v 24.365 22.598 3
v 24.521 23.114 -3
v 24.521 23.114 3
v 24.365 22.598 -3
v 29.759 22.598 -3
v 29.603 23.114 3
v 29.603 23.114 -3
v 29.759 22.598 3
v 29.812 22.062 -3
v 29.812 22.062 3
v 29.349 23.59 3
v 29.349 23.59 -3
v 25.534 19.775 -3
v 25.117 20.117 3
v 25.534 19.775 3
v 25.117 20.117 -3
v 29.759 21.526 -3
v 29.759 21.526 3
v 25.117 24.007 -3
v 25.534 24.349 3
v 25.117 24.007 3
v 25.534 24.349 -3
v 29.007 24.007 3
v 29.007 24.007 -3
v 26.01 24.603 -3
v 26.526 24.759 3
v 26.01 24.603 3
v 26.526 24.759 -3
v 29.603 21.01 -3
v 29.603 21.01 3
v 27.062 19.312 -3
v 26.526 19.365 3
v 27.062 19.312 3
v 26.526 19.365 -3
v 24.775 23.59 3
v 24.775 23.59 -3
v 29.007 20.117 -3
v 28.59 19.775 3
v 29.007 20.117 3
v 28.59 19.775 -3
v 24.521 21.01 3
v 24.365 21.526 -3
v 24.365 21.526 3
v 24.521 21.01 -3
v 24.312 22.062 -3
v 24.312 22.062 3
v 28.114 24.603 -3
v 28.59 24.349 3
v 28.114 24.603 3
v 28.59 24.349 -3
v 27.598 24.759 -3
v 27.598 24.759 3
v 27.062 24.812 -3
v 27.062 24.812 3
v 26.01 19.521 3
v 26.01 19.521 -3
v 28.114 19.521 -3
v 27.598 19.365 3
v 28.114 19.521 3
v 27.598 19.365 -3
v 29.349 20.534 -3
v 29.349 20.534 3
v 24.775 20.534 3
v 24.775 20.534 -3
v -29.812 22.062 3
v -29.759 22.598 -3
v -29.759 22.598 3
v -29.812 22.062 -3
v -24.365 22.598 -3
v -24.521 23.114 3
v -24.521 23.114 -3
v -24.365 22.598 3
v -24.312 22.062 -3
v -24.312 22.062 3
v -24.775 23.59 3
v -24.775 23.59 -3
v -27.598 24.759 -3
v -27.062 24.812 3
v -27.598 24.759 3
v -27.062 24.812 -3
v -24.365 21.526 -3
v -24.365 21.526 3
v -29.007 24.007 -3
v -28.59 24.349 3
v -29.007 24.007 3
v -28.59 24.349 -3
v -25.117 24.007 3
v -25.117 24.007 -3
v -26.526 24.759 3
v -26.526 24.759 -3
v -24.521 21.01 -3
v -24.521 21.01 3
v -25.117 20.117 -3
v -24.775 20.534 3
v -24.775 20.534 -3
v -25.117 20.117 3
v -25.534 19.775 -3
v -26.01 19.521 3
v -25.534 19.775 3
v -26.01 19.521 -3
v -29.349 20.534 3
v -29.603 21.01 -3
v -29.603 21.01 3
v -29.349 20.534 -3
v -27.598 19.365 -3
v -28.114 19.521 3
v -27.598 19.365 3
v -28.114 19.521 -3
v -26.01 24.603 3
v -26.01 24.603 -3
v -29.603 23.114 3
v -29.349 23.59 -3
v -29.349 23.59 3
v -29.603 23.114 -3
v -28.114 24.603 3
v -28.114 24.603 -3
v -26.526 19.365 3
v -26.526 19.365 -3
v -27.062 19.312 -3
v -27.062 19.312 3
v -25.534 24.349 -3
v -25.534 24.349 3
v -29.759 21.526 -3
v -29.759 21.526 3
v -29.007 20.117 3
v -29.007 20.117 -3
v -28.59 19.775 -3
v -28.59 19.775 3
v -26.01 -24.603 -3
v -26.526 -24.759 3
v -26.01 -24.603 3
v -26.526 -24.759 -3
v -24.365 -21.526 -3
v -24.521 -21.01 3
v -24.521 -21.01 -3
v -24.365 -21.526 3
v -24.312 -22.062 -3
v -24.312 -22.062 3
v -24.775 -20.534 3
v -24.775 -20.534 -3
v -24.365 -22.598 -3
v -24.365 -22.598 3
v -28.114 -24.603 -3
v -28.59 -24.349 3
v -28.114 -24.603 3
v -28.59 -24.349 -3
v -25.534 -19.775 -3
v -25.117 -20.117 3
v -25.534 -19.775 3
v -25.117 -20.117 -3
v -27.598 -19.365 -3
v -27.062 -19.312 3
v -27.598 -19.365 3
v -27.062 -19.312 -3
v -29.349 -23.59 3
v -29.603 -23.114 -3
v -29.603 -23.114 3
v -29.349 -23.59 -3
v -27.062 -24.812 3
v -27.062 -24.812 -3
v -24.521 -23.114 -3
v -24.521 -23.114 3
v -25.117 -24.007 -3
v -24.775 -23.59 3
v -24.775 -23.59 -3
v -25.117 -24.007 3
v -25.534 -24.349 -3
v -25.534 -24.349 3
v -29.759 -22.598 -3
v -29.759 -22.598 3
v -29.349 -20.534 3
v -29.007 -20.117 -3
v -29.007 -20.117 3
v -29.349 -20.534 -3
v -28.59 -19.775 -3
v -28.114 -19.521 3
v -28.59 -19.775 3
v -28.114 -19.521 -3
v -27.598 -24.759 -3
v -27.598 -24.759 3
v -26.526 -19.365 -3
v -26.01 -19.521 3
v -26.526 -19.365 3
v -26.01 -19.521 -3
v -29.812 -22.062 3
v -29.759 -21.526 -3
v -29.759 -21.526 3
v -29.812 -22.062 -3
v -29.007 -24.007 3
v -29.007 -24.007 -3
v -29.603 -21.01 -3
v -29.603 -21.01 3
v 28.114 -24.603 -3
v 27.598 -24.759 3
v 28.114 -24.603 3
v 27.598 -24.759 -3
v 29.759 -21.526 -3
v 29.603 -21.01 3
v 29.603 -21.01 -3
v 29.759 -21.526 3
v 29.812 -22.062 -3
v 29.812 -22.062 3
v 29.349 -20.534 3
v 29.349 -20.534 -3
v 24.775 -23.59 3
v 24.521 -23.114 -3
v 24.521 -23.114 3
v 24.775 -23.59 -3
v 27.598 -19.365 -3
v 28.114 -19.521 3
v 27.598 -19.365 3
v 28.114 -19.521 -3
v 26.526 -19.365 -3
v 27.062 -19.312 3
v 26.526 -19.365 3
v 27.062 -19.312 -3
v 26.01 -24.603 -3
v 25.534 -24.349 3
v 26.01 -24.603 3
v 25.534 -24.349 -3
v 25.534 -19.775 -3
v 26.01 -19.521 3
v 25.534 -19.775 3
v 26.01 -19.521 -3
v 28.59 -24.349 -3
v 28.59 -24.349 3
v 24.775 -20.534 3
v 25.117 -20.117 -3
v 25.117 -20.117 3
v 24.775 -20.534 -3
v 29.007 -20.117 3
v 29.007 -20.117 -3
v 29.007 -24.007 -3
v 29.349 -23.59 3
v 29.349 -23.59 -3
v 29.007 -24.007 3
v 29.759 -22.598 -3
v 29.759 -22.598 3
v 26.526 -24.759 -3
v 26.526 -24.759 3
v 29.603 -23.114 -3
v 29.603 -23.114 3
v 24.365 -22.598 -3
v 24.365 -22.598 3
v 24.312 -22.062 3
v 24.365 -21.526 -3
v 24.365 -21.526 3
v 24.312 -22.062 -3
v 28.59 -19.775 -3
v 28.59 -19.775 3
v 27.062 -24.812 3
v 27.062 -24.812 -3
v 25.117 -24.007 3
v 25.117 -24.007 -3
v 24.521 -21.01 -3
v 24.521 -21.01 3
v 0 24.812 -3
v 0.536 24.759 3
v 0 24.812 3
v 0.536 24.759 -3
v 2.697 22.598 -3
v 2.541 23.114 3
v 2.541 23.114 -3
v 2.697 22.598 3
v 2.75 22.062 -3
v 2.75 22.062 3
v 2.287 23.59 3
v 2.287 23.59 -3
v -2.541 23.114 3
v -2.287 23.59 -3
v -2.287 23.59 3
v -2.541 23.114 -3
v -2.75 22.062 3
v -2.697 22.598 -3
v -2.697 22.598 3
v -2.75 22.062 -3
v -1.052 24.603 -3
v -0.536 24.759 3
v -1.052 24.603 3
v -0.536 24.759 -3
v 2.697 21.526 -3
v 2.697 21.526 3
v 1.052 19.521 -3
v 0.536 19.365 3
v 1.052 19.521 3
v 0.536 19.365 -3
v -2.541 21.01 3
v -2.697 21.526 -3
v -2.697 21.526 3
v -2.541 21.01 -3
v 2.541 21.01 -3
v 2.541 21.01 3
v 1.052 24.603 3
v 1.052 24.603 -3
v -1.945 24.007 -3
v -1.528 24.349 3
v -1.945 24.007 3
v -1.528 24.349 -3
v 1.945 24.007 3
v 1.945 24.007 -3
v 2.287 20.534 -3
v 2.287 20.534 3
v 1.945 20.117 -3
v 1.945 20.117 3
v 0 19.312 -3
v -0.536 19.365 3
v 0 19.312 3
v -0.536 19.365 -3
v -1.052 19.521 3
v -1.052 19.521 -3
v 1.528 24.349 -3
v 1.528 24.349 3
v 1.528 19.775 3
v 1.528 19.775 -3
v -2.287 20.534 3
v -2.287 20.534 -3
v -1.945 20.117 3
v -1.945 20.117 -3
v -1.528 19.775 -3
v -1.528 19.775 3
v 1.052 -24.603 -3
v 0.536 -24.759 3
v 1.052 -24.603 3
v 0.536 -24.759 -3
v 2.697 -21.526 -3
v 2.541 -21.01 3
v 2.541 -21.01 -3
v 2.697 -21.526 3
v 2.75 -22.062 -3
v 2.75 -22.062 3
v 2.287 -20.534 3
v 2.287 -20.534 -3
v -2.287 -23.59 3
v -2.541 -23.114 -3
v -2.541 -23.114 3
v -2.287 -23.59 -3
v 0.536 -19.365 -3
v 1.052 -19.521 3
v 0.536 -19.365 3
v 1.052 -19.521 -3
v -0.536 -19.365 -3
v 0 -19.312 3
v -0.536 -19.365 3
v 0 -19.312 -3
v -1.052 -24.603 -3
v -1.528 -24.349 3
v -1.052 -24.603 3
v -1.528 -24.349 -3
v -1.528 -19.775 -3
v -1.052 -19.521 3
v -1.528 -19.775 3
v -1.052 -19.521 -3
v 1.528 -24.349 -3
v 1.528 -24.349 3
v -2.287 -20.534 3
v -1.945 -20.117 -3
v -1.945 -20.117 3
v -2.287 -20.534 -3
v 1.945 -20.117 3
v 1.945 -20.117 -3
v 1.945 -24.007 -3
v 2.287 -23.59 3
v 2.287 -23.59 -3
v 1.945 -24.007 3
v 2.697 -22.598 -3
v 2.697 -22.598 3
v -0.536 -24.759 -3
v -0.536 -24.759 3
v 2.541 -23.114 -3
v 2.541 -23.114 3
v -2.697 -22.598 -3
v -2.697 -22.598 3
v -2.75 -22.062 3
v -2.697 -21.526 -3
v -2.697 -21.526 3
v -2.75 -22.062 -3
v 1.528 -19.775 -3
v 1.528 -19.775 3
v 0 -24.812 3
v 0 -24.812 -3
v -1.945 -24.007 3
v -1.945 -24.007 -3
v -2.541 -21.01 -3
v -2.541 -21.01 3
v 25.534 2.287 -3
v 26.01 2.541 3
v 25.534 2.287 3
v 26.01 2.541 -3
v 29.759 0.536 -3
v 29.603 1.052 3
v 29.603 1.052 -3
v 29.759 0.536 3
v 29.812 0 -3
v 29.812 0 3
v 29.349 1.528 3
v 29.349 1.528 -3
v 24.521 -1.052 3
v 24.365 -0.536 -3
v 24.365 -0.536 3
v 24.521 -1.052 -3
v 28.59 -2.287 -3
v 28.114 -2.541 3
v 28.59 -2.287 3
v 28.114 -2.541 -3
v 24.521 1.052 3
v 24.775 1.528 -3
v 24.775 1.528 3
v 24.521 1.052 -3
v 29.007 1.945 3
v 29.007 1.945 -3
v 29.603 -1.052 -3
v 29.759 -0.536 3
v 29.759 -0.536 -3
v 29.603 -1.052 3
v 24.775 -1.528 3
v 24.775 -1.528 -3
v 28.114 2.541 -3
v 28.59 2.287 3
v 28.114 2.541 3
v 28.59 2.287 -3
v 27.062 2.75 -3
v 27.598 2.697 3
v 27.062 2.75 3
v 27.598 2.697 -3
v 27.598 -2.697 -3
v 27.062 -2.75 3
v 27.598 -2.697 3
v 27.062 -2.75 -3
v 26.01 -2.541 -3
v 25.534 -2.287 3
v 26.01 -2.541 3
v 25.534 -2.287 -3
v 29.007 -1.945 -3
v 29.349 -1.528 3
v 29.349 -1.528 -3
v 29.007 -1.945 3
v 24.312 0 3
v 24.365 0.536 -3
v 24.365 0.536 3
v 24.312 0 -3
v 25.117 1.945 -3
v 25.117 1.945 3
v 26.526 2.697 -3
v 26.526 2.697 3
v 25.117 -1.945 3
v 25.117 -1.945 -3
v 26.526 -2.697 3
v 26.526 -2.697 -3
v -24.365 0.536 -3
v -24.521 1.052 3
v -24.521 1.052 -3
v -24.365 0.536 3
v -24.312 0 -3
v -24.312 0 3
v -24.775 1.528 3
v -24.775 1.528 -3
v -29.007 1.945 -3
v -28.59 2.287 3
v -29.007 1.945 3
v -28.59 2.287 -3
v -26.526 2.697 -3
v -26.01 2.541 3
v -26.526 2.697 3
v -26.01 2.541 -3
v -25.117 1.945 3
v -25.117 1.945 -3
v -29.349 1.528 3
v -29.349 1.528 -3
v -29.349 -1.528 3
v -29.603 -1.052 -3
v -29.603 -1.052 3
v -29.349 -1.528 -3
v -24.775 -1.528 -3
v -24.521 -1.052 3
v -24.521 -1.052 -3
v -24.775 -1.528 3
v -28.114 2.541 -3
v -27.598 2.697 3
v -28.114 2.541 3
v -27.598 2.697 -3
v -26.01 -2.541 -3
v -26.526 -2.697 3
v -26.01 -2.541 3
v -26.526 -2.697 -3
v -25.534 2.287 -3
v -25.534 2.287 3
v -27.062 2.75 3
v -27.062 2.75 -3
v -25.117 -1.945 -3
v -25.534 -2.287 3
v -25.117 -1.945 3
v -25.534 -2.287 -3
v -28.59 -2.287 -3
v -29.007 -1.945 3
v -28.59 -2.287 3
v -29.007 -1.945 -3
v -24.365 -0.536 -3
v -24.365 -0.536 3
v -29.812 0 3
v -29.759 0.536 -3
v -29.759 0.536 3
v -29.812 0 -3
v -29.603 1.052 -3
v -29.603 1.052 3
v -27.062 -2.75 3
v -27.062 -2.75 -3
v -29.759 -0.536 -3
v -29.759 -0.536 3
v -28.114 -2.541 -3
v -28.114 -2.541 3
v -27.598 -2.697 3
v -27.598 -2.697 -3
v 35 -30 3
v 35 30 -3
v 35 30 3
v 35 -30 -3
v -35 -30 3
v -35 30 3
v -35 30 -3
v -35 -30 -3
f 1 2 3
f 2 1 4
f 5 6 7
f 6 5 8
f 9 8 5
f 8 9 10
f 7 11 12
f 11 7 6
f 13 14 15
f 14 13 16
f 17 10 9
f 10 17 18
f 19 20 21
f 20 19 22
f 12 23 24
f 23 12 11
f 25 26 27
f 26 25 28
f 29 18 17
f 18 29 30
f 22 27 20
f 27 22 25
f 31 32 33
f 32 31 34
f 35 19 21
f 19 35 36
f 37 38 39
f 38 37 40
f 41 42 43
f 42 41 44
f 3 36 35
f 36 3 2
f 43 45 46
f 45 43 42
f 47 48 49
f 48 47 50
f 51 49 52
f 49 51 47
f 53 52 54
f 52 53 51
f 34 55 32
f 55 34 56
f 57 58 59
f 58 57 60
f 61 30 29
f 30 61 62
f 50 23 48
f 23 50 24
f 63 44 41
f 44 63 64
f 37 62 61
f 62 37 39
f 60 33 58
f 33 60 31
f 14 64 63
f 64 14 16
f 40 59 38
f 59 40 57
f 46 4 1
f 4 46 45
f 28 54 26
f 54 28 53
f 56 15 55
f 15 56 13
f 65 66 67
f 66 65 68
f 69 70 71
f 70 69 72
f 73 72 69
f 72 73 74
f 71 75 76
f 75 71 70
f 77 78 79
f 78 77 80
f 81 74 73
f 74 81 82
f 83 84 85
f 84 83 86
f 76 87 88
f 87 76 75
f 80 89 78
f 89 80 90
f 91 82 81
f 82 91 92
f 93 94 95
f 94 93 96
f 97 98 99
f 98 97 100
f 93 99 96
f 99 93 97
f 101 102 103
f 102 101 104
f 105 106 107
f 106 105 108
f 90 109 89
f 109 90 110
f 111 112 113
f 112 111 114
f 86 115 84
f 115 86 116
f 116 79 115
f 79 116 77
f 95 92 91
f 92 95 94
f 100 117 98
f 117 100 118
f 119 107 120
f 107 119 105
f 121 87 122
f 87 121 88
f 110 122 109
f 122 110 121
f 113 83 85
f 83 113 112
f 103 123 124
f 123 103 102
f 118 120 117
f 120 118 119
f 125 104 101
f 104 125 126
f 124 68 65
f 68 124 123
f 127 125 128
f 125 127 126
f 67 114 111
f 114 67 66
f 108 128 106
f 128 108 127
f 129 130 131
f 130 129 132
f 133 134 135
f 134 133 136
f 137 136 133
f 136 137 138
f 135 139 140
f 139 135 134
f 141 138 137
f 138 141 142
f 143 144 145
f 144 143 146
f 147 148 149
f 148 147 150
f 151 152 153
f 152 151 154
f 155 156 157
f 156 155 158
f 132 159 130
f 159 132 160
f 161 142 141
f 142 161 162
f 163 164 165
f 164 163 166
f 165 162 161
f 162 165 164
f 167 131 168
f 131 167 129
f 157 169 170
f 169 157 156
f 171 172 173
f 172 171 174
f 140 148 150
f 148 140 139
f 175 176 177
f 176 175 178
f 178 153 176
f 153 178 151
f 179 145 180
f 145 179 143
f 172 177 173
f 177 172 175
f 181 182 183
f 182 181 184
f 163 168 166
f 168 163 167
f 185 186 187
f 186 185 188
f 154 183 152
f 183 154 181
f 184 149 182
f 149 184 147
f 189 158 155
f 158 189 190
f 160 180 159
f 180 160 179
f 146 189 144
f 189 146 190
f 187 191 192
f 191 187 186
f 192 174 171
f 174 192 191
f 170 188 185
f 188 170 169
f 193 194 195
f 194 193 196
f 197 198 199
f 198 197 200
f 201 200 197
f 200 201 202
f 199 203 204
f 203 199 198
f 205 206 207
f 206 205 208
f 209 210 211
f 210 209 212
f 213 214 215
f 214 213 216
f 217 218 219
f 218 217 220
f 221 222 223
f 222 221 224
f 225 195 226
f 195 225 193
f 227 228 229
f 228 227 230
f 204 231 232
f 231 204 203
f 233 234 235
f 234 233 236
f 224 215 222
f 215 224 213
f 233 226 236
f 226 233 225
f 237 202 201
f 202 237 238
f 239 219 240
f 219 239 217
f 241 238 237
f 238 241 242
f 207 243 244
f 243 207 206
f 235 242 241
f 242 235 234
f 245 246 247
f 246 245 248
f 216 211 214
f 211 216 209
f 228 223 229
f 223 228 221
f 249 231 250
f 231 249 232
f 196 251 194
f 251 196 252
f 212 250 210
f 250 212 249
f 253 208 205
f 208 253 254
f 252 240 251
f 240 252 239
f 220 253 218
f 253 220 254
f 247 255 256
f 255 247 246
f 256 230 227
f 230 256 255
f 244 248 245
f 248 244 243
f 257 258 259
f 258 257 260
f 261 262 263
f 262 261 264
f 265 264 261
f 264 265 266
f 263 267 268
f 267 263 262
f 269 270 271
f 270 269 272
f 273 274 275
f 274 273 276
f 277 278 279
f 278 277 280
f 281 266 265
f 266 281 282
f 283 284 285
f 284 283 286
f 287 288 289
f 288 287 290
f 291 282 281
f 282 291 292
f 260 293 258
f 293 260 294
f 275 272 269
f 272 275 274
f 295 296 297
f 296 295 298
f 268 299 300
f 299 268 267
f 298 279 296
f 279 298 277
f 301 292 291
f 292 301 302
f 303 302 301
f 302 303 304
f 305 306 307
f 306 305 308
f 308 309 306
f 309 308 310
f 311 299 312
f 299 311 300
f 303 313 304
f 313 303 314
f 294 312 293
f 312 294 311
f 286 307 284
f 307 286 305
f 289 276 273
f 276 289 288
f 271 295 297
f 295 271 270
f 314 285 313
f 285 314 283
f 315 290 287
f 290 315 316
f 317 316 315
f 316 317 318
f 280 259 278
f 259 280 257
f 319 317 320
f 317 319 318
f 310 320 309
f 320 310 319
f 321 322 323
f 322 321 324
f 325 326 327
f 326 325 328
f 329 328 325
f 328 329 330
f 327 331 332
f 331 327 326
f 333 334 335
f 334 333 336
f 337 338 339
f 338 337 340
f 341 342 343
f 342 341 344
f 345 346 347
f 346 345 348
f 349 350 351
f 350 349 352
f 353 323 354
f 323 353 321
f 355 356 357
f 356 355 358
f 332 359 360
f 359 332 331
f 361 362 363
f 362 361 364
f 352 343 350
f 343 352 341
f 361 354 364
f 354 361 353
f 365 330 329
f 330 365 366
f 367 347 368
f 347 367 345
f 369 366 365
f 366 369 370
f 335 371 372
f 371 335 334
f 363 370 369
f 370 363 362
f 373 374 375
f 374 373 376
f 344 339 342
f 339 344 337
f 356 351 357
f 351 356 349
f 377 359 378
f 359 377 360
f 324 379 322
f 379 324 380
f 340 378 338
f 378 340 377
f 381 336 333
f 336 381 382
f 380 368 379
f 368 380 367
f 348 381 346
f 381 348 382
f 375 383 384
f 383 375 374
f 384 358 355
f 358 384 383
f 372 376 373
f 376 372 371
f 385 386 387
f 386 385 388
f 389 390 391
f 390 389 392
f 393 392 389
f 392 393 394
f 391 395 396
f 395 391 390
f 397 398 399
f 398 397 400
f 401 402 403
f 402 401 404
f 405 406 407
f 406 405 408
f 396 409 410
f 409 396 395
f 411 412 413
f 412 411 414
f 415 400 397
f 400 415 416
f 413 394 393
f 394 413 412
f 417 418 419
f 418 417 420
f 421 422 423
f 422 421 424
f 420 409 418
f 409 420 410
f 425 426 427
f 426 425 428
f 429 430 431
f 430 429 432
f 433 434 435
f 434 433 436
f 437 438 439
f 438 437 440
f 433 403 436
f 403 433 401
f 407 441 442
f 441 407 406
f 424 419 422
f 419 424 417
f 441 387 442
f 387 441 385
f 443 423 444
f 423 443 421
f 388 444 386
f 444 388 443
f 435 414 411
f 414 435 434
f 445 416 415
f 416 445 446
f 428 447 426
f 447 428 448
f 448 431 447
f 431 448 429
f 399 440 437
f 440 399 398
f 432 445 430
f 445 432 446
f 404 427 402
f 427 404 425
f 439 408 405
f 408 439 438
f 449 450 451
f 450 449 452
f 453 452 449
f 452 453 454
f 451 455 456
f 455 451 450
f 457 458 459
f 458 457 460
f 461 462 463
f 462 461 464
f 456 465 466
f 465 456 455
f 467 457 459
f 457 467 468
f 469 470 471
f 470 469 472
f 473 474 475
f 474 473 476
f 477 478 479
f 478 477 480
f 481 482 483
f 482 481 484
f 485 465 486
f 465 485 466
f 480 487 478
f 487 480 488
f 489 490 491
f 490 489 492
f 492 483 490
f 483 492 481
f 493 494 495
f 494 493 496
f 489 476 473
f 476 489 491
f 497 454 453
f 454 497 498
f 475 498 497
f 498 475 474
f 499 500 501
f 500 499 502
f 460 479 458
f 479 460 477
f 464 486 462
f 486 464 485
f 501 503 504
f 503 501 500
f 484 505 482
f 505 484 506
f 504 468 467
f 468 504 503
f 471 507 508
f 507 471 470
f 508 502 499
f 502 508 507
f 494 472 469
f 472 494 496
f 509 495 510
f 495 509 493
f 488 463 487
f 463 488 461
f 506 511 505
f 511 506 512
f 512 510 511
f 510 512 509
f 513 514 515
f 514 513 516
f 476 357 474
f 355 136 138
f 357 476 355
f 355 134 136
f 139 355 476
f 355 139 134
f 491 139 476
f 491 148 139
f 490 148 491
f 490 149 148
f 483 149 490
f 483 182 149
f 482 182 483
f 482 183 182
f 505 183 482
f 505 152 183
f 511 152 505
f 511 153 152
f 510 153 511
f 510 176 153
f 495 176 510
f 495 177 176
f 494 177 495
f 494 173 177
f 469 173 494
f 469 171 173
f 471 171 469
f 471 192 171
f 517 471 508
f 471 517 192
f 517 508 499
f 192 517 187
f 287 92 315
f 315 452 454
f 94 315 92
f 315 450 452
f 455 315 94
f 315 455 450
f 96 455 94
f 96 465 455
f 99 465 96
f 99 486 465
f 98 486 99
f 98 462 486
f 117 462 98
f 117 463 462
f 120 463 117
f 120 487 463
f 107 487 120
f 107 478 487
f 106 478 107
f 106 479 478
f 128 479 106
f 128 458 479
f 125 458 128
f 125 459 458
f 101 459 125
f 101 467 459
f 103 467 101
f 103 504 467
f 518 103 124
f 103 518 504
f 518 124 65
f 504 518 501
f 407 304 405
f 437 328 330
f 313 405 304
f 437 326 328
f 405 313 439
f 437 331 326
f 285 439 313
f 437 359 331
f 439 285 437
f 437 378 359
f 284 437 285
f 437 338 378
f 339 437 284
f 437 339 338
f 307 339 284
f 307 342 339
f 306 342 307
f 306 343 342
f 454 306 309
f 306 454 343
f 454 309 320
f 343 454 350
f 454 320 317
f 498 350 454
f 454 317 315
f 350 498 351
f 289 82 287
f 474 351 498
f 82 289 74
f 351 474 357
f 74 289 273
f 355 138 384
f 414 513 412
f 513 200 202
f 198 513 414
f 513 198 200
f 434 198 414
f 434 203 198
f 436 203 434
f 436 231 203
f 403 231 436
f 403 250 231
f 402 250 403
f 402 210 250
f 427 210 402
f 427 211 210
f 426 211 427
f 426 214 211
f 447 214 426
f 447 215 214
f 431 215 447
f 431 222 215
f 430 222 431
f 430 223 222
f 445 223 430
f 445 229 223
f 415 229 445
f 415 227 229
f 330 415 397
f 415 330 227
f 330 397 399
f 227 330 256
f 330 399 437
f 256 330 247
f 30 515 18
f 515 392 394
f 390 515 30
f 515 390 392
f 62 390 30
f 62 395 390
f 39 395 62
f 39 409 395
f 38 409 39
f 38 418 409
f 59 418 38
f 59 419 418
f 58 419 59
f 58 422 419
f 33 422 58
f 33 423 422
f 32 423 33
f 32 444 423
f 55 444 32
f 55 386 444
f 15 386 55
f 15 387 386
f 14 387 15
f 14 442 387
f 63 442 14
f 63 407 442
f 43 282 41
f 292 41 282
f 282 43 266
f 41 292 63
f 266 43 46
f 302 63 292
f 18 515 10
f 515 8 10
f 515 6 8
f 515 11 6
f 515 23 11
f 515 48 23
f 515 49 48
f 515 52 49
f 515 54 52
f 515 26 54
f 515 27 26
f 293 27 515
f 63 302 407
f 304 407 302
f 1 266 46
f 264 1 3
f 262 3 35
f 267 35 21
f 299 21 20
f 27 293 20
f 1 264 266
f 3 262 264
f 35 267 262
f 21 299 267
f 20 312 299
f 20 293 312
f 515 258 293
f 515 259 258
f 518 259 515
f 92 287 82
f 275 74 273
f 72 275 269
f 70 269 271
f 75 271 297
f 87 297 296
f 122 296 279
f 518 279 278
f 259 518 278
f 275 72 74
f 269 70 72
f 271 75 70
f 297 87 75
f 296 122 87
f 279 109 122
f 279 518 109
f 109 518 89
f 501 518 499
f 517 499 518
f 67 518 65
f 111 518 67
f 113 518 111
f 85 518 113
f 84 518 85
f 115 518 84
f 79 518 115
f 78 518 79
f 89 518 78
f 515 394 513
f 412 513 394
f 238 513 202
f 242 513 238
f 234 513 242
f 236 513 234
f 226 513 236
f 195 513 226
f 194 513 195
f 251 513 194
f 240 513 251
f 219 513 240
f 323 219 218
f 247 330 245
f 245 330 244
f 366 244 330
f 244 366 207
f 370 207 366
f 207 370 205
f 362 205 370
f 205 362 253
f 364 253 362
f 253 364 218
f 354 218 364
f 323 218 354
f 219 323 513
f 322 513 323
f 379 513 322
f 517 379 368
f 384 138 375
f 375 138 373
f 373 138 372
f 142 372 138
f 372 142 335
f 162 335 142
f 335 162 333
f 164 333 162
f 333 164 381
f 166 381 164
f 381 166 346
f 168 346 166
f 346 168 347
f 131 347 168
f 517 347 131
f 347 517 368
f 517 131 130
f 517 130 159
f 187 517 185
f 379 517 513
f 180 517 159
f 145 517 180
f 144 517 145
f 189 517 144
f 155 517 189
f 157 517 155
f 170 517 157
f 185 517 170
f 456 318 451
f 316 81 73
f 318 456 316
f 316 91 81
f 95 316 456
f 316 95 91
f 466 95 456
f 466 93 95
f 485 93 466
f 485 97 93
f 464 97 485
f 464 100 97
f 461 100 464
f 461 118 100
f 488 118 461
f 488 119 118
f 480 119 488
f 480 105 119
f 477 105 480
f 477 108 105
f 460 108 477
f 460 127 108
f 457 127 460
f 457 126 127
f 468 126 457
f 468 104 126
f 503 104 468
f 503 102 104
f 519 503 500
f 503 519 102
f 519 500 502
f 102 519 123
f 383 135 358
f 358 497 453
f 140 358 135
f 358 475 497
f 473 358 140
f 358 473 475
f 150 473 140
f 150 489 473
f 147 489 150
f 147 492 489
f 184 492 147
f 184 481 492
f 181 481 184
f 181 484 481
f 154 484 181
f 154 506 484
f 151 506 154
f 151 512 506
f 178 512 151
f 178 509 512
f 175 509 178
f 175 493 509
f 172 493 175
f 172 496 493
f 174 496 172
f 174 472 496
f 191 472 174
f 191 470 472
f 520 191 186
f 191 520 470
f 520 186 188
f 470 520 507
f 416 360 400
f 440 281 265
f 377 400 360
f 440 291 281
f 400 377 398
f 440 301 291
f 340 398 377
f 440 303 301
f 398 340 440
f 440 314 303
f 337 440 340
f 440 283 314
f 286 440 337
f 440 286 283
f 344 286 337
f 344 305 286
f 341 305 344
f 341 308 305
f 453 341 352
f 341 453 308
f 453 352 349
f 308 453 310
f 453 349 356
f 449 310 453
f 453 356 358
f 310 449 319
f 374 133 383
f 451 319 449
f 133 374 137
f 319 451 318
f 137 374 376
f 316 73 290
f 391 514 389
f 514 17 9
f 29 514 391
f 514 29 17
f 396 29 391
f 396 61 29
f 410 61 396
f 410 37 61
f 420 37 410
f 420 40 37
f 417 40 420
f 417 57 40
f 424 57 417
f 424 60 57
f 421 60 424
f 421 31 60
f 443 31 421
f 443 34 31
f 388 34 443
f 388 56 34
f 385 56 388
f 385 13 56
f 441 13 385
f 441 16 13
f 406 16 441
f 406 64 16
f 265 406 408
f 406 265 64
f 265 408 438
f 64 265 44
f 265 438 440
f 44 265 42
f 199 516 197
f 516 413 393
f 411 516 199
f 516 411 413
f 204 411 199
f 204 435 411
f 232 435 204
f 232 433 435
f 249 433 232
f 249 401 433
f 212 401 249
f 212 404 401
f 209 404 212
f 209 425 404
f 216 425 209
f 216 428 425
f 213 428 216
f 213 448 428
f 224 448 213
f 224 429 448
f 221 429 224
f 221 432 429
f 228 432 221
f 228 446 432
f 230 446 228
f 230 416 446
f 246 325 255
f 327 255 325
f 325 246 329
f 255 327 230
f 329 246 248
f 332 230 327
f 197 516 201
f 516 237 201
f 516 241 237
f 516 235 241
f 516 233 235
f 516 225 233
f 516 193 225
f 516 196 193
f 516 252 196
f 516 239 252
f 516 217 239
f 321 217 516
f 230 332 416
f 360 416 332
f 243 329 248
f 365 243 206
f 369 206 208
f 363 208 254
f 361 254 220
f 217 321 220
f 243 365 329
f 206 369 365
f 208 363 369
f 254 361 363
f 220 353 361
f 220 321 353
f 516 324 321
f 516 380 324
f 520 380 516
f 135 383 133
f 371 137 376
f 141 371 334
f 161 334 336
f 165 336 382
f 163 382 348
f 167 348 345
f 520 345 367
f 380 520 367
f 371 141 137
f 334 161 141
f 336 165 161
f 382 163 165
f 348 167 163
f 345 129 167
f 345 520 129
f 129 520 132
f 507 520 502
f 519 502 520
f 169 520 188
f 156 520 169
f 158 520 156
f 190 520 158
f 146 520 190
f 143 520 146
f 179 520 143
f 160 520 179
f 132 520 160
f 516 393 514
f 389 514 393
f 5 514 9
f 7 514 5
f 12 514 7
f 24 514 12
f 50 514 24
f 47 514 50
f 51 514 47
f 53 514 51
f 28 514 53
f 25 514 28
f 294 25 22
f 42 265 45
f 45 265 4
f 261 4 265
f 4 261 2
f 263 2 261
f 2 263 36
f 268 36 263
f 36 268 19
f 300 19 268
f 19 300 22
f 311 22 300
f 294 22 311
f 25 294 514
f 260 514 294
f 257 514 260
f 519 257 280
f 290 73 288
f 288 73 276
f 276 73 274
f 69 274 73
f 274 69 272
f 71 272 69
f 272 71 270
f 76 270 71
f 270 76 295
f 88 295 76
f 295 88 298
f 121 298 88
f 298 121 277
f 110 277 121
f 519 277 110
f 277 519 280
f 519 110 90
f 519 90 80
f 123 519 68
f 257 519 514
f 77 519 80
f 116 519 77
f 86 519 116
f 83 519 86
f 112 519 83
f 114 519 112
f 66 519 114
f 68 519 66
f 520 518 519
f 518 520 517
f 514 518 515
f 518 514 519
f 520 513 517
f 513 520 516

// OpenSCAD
$fn = 32;

// ----------------------------------------------------------------------
// Corner plate 70 x 60 x 6
// 8 holes, centres taken from the edge offset
// ----------------------------------------------------------------------

// --- parameters (mm) ---
plate = [70, 60, 6];  // overall size (x, y, z)
holes = 8;            // number of holes the drawing asks for
hole_d = 5.5;         // hole diameter
edge = 7.938;         // hole centre offset from the plate edge

// --- derived feature positions (mm) ---
corner_x = plate[0] / 2 - edge;  // = 27.06   corner hole X
corner_y = plate[1] / 2 - edge;  // = 22.06   corner hole Y
feature_centers = [
  [corner_x, corner_y],
  [-corner_x, corner_y],
  [-corner_x, -corner_y],
  [corner_x, -corner_y],
  [0, corner_y],
  [0, -corner_y],
  [corner_x, 0],
  [-corner_x, 0]
];   // hole centres the loop below drills

// plate outline, every hole drilled through with the same cutters
difference() {
  cube(plate, center = true);
  for (centre = feature_centers)
    translate([centre[0], centre[1], 0])
      cylinder(d = hole_d, h = plate[2] + 2, center = true);
}
